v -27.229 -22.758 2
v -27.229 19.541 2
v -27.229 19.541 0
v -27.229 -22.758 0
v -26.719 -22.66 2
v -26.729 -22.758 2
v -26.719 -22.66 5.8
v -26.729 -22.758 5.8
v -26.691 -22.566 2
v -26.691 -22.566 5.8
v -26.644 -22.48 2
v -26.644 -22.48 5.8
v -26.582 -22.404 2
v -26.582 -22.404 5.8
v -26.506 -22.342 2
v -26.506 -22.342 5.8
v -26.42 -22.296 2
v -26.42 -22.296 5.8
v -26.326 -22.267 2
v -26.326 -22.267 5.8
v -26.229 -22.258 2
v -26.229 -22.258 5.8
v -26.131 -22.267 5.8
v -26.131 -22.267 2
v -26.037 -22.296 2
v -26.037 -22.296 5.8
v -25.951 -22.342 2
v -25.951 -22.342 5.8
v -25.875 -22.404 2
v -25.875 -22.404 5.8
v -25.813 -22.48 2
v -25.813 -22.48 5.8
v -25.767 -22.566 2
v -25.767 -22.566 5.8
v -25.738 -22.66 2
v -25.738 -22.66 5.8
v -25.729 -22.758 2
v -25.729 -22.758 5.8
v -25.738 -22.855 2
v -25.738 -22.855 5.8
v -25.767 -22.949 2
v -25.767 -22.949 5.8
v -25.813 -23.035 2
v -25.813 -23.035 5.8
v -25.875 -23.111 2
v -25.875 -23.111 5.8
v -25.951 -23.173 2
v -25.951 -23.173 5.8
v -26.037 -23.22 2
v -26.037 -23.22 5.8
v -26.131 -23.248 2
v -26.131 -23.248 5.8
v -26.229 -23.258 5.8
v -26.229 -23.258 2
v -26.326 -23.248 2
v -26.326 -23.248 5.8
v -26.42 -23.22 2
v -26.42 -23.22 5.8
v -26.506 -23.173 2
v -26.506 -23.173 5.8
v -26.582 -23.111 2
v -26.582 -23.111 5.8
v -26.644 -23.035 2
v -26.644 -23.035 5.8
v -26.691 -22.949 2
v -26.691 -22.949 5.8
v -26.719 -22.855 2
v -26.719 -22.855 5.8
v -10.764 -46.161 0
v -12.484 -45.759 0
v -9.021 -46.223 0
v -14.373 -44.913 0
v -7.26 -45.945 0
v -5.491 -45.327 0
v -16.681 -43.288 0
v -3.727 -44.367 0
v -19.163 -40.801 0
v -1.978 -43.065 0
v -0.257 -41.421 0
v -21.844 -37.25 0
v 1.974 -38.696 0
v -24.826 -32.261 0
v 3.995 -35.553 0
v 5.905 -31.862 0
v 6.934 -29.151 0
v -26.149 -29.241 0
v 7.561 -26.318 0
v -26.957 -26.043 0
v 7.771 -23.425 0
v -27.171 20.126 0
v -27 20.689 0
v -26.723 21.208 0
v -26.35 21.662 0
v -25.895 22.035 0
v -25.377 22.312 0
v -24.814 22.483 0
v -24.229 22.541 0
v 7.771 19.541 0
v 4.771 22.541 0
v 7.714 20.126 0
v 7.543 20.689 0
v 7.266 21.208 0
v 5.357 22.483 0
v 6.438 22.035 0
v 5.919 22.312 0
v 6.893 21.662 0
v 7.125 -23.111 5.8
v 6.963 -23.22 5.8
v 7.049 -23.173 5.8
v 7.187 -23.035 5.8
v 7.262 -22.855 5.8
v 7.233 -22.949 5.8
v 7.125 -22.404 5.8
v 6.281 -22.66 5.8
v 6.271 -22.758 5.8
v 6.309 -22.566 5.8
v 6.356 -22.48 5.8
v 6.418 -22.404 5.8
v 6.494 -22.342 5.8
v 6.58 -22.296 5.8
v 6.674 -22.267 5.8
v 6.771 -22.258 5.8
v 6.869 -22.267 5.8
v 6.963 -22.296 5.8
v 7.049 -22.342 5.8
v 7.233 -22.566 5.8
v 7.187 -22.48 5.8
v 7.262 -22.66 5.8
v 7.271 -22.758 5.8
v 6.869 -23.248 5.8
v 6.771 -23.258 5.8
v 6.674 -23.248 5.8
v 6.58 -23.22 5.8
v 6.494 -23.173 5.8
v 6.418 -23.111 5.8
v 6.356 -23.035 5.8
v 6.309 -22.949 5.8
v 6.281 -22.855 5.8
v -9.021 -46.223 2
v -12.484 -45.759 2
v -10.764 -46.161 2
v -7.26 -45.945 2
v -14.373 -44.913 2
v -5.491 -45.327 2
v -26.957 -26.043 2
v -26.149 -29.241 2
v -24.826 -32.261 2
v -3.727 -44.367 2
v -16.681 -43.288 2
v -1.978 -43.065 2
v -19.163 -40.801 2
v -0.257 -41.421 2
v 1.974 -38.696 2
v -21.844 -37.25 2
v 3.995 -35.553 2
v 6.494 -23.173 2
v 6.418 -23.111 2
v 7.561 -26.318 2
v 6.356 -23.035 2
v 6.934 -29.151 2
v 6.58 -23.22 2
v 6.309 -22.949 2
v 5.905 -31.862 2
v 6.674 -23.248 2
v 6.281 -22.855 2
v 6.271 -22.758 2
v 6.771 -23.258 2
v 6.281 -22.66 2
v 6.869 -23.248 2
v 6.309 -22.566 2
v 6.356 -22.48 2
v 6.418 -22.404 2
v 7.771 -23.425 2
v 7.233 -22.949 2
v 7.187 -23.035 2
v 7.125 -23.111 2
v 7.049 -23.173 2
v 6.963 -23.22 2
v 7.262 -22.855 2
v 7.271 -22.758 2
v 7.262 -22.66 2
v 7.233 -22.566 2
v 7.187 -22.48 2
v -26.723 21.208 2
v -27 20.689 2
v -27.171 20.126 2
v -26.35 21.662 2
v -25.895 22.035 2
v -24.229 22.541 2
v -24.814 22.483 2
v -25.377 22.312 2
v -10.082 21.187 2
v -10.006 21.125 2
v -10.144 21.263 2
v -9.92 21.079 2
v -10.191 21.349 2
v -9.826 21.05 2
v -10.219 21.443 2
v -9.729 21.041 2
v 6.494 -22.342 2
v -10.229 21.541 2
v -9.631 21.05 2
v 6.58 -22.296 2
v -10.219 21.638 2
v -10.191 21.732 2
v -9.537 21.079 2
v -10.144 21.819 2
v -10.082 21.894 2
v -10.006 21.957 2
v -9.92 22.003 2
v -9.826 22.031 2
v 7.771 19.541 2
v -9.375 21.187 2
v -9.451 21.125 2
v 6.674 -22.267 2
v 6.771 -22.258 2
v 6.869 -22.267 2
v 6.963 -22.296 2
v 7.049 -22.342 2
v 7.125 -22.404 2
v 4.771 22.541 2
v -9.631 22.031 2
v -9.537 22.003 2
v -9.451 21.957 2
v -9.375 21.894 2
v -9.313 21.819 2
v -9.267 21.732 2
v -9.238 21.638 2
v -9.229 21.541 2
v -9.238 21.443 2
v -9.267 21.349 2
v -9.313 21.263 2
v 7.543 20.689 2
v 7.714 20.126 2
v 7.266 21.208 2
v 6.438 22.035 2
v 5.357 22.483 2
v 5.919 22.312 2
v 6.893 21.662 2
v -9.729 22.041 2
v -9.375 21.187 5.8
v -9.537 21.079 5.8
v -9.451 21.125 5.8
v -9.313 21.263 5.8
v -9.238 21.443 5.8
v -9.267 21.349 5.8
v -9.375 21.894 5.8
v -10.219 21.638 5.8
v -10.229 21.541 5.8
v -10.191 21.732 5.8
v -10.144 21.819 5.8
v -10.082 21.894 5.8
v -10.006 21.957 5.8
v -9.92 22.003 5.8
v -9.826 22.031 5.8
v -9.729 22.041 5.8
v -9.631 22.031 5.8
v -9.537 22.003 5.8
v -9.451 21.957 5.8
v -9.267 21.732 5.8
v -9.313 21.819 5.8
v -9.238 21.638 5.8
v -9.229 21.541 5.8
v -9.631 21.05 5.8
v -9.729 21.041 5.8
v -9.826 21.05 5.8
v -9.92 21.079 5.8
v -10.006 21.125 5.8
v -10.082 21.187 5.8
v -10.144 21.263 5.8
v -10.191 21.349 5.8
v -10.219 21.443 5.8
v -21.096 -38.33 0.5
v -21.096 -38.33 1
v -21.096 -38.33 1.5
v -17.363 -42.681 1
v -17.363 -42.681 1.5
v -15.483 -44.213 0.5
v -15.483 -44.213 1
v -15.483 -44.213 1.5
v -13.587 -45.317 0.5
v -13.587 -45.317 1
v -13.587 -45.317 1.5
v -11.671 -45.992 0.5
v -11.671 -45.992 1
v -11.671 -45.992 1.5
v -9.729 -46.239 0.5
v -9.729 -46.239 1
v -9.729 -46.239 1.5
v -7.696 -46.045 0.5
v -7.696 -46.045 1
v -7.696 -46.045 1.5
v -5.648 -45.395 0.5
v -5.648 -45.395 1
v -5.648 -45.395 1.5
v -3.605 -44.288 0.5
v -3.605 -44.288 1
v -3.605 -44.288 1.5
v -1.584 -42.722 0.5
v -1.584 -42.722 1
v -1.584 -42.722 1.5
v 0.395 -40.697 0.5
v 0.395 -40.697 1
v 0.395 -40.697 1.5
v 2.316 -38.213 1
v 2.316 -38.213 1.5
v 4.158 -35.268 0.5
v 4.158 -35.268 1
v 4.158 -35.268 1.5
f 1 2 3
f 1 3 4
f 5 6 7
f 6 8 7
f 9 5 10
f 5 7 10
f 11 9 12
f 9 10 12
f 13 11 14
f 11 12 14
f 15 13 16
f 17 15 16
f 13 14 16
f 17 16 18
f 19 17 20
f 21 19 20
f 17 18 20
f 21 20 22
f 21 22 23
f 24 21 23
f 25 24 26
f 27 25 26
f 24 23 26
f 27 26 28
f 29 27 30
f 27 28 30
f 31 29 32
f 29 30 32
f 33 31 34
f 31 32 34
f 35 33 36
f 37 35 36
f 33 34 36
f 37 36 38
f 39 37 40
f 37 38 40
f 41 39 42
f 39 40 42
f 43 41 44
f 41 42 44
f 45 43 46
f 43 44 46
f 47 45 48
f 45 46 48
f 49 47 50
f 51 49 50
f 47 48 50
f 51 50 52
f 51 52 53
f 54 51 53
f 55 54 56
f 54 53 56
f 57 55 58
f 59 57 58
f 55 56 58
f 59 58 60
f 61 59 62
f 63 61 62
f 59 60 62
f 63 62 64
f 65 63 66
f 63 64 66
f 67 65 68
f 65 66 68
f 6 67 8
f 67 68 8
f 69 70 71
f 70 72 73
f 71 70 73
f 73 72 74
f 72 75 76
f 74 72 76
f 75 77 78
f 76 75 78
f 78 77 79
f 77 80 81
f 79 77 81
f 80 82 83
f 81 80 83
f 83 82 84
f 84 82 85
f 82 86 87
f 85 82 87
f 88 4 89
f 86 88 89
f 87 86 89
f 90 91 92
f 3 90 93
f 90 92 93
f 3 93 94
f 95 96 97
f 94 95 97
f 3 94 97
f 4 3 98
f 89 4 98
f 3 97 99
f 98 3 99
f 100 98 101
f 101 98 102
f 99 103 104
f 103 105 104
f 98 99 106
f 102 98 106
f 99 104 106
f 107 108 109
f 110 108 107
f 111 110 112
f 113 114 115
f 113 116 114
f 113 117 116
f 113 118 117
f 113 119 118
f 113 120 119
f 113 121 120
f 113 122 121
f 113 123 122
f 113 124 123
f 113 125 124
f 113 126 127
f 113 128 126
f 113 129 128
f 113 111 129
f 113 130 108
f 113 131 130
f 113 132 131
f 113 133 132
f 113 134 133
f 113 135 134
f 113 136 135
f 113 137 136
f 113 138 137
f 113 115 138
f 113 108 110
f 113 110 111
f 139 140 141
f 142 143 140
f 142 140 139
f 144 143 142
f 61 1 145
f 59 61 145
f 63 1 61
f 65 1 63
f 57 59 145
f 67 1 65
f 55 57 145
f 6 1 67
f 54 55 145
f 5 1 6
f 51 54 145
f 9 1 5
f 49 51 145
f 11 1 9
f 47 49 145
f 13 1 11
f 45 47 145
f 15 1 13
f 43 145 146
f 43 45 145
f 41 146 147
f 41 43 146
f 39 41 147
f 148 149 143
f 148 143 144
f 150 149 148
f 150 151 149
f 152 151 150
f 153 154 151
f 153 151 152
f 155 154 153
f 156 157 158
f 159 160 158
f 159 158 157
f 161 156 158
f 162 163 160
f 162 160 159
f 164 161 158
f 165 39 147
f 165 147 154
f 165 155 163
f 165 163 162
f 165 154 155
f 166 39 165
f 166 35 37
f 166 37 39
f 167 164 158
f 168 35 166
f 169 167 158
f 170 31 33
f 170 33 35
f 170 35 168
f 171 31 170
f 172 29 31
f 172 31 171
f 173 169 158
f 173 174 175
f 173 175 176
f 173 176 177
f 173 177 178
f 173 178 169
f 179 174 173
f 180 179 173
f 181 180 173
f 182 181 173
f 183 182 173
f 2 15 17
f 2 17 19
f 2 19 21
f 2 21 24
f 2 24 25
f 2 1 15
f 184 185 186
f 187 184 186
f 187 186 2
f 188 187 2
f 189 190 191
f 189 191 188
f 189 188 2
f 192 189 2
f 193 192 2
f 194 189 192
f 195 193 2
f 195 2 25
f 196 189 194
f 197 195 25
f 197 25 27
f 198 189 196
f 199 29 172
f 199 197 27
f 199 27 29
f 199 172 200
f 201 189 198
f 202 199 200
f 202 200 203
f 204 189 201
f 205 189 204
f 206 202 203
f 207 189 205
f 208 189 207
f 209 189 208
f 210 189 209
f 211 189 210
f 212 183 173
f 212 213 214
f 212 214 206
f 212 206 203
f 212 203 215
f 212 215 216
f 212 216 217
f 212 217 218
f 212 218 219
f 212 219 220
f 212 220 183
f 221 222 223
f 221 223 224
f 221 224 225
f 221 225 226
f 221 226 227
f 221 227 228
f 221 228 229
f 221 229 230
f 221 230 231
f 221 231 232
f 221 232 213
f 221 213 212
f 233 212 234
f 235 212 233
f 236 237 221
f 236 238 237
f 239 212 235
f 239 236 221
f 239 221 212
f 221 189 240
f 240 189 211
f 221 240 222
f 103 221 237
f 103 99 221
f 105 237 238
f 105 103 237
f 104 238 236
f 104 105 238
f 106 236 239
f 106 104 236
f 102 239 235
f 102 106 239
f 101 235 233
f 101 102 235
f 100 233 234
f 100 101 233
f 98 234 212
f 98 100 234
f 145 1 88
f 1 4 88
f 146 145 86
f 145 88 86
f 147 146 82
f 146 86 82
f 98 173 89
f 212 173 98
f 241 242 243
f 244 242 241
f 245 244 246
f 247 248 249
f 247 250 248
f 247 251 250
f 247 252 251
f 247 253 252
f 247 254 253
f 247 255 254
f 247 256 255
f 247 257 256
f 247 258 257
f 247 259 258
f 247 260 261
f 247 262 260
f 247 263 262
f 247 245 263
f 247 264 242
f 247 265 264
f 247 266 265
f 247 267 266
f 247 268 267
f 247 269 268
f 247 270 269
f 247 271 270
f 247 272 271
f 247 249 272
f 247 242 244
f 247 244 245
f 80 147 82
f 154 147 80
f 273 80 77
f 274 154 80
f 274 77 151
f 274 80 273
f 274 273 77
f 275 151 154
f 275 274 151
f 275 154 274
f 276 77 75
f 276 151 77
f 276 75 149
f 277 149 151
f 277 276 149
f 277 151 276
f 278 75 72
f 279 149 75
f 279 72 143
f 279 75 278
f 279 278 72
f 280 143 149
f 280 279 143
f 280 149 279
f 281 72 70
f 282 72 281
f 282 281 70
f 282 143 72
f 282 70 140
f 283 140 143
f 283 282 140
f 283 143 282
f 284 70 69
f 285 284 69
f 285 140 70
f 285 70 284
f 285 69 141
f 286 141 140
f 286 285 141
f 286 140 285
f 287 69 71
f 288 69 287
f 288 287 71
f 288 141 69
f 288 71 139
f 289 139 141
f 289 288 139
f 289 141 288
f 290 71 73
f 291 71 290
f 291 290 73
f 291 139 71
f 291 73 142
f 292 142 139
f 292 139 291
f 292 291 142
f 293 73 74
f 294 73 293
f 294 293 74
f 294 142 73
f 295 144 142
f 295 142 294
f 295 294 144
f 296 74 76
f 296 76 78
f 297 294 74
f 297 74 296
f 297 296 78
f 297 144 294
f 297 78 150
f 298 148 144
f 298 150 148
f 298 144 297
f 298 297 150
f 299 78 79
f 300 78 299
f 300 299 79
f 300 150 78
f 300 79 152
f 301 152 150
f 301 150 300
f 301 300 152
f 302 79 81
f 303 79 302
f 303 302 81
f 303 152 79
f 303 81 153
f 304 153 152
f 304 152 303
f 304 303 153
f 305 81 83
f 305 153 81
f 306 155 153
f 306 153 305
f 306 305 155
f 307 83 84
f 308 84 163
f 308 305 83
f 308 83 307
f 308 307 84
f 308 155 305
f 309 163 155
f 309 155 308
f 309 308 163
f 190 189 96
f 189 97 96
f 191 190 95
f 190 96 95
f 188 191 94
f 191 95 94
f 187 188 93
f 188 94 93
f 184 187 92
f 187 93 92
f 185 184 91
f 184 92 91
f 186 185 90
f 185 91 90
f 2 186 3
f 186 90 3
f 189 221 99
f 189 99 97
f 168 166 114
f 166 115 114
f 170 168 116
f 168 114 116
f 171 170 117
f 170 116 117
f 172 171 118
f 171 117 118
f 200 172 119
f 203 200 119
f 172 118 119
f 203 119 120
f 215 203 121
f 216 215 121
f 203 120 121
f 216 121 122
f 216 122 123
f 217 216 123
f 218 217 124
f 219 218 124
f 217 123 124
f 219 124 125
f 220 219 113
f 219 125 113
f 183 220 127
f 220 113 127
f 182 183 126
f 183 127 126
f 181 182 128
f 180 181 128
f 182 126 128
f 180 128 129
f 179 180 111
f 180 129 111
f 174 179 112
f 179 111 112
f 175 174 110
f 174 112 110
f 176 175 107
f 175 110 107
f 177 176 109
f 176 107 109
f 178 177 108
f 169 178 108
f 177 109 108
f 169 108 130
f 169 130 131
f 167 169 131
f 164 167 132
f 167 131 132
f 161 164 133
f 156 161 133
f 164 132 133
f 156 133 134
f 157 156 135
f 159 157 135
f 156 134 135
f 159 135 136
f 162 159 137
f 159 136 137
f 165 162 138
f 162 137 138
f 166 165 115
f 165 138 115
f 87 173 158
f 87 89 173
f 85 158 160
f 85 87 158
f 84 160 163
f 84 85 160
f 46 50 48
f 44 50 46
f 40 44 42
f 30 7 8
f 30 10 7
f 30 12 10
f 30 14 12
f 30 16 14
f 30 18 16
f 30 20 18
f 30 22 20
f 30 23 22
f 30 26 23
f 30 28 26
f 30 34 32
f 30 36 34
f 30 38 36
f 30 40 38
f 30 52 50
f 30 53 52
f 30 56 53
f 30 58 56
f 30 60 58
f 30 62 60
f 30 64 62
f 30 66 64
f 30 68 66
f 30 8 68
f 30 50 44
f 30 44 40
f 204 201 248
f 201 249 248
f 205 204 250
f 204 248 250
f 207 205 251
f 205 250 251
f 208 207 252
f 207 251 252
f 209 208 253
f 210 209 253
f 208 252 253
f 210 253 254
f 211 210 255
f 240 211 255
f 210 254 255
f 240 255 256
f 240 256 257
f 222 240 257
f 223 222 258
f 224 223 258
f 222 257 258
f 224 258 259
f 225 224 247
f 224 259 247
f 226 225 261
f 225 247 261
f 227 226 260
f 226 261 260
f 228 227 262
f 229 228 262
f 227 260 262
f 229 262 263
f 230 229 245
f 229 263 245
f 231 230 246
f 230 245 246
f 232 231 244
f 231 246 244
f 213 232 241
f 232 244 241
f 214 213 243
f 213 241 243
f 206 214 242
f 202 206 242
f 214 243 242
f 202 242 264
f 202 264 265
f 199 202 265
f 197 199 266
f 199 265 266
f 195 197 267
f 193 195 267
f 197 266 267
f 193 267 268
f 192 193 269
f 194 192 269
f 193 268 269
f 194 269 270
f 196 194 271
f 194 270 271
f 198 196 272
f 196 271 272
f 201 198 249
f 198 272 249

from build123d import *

# Parameters (mm, degrees)
BOSS_EXTRUDE1_DEPTH = 2
SKETCH2_W           = 0.5
SKETCH2_H           = 3.8
SKETCH3_W           = 0.5
SKETCH3_H           = 3.8
SKETCH4_W           = 0.5
SKETCH4_H           = 3.8
FILLET1_R           = 3
FILLET2_R           = 20


with BuildPart() as part:
    # Sketch1 → Boss-Extrude1 (new body)
    with BuildSketch(Plane.XY.offset(2)):
        with BuildLine():
            Line((7.771354167, 22.540832259), (-27.228645833, 22.540832259))
            Line((-27.228645833, 22.540832259), (-27.228645833, -27.813067392))
            add(Edge.make_bspline(
                [(-27.228645833, -27.813067392), (-26.427873486, -29.29582054), (-25.627101139, -30.778573688), (-24.826328792, -32.261326836), (-19.837606386, -41.498713565), (-9.897506481, -50.952288279), (1.392273584, -41.560087902), (5.904599103, -31.862127656), (6.526850791, -30.524774642), (7.149102479, -29.187421629), (7.771354167, -27.850068615)],
                knots=[0, 0, 0, 0, 0.06863763, 0.06863763, 0.06863763, 0.496242407, 0.937653653, 0.937653653, 0.937653653, 0.998524459, 0.998524459, 0.998524459, 0.998524459], degree=3))
            Line((7.771354167, -27.850068615), (7.771354167, 22.540832259))
        make_face()
    extrude(amount=-BOSS_EXTRUDE1_DEPTH)

    # Sketch2 → Revolve1 (revolve)
    with BuildSketch(Plane.XZ.offset(22.757561557), mode=Mode.PRIVATE) as revolve1_sk:
        with Locations((7.021354167, 3.9)):
            Rectangle(SKETCH2_W, SKETCH2_H)
    revolve(revolve1_sk.sketch.rotate(Axis((6.771354167, -22.757561557, 5.8), (0, 0, -1)), 180), axis=Axis((6.771354167, -22.757561557, 5.8), (0, 0, -1)))

    # Sketch3 → Revolve2 (revolve)
    with BuildSketch(Plane.XZ.offset(22.757561557), mode=Mode.PRIVATE) as revolve2_sk:
        with Locations((-25.978645833, 3.9)):
            Rectangle(SKETCH3_W, SKETCH3_H)
    revolve(revolve2_sk.sketch.rotate(Axis((-26.228645833, -22.757561557, 5.8), (0, 0, -1)), 180), axis=Axis((-26.228645833, -22.757561557, 5.8), (0, 0, -1)))

    # Sketch4 → Revolve3 (revolve)
    with BuildSketch(Plane.XZ.offset(-21.540832259), mode=Mode.PRIVATE) as revolve3_sk:
        with Locations((-9.478645833, 3.9)):
            Rectangle(SKETCH4_W, SKETCH4_H)
    revolve(revolve3_sk.sketch.rotate(Axis((-9.728645833, 21.540832259, 5.8), (0, 0, -1)), 180), axis=Axis((-9.728645833, 21.540832259, 5.8), (0, 0, -1)))

    # Fillet1
    fillet1_edges = [part.edges().sort_by_distance(p)[0] for p in [
        (-27.228645833, 22.540832259, 1),
        (7.771354167, 22.540832259, 1),
    ]]
    fillet(fillet1_edges, radius=FILLET1_R)

    # Fillet2
    fillet2_edges = [part.edges().sort_by_distance(p)[0] for p in [
        (7.771354167, -27.850068615, 1),
        (-27.228645833, -27.813067392, 1),
    ]]
    fillet(fillet2_edges, radius=FILLET2_R)


solid = part.part
